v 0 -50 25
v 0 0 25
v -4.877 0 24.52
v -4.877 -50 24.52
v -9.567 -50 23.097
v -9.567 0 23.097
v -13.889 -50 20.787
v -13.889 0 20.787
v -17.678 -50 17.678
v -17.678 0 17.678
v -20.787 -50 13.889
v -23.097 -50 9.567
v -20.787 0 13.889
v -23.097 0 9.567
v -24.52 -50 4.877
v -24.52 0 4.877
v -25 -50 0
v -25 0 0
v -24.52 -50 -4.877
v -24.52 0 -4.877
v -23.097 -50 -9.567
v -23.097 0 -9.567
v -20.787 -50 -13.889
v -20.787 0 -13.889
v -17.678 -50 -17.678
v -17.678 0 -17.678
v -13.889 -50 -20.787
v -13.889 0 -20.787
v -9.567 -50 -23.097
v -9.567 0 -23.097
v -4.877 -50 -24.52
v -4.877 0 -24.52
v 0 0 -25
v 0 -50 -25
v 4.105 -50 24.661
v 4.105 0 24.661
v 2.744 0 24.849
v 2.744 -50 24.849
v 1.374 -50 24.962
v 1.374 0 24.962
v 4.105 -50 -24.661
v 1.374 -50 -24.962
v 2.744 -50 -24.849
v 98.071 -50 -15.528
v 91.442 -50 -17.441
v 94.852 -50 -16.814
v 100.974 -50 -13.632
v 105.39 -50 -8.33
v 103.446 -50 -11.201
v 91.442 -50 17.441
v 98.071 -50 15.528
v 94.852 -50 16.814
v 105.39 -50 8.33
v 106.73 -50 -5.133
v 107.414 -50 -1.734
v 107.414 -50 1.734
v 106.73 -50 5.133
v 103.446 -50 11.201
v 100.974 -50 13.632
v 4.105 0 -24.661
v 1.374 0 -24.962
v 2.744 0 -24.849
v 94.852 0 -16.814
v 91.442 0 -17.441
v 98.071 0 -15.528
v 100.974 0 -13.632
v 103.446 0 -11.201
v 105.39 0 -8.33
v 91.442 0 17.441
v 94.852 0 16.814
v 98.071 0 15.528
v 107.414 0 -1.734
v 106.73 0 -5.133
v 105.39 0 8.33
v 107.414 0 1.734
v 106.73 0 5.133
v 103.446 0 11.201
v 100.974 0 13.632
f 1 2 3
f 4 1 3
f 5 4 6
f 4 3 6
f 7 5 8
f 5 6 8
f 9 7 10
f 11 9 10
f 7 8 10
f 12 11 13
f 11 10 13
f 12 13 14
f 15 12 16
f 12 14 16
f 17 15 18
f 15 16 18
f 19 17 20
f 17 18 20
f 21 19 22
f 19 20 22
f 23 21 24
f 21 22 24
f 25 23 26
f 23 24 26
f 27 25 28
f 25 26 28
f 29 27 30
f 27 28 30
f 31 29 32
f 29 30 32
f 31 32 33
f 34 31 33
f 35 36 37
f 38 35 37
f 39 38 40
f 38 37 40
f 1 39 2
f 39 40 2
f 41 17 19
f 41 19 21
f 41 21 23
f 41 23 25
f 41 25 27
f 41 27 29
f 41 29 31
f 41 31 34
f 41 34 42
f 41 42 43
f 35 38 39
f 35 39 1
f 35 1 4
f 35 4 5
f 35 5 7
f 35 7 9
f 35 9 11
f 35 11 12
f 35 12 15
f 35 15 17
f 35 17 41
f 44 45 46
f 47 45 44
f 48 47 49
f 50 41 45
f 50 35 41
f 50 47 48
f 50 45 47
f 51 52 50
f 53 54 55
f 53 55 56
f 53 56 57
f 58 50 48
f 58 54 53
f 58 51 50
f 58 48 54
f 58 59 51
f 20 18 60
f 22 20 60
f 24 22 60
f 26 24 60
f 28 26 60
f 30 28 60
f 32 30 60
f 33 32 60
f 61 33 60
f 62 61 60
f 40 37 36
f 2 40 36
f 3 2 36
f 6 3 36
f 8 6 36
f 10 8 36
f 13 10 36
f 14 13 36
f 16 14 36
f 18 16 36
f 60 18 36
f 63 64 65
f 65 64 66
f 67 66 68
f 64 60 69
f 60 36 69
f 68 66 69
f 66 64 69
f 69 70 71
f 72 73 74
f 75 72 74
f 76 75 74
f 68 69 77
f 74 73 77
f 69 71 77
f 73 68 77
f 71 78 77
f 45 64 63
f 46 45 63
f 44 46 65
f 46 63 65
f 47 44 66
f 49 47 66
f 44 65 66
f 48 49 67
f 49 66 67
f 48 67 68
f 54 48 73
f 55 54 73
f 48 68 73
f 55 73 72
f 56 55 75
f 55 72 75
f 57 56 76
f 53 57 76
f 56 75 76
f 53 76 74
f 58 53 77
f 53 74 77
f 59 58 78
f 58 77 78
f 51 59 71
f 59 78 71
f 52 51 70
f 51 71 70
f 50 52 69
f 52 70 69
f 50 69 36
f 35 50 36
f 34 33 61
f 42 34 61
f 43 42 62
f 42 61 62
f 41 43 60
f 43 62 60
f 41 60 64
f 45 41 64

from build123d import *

# Parameters (mm, degrees)
F1_DEPTH = 50


with BuildPart() as f1:
    # F0 (on Front) → F1 (new body)
    with BuildSketch(Plane.XZ):
        with BuildLine():
            Line((91.4418067738, 17.4405043857), (4.1054428346, 24.6606029758))
            ThreePointArc((4.1054428346, 24.6606029758), (19.0740146648, 16.1611251022), (25, 0))
            ThreePointArc((25, 0), (19.0740146648, -16.1611251022), (4.1054428346, -24.6606029758))
            Line((4.1054428346, -24.6606029758), (91.4418067738, -17.4405043857))
            ThreePointArc((91.4418067738, -17.4405043857), (72.5, 0), (91.4418067738, 17.4405043857))
        make_face()
        with BuildLine():
            ThreePointArc((4.1054428346, 24.6606029758), (2.0597239626, 24.9150062653), (0, 25))
            Line((0, 25), (4.1054428346, 24.6606029758))
        make_face()
        with BuildLine():
            Line((4.1054428346, -24.6606029758), (0, -25))
            ThreePointArc((0, -25), (2.0597239626, -24.9150062653), (4.1054428346, -24.6606029758))
        make_face()
        with BuildLine():
            ThreePointArc((107.5, 0), (102.8740362463, 11.8536572723), (91.4418067738, 17.4405043857))
            ThreePointArc((91.4418067738, 17.4405043857), (72.5, 0), (91.4418067738, -17.4405043857))
            ThreePointArc((91.4418067738, -17.4405043857), (102.8740362463, -11.8536572723), (107.5, 0))
        make_face()
        with BuildLine():
            Line((4.1054428346, 24.6606029758), (0, 25))
            ThreePointArc((0, 25), (-25, 0), (0, -25))
            Line((0, -25), (4.1054428346, -24.6606029758))
            ThreePointArc((4.1054428346, -24.6606029758), (19.0740146648, -16.1611251022), (25, 0))
            ThreePointArc((25, 0), (19.0740146648, 16.1611251022), (4.1054428346, 24.6606029758))
        make_face()
    extrude(amount=F1_DEPTH)


solid = f1.part
